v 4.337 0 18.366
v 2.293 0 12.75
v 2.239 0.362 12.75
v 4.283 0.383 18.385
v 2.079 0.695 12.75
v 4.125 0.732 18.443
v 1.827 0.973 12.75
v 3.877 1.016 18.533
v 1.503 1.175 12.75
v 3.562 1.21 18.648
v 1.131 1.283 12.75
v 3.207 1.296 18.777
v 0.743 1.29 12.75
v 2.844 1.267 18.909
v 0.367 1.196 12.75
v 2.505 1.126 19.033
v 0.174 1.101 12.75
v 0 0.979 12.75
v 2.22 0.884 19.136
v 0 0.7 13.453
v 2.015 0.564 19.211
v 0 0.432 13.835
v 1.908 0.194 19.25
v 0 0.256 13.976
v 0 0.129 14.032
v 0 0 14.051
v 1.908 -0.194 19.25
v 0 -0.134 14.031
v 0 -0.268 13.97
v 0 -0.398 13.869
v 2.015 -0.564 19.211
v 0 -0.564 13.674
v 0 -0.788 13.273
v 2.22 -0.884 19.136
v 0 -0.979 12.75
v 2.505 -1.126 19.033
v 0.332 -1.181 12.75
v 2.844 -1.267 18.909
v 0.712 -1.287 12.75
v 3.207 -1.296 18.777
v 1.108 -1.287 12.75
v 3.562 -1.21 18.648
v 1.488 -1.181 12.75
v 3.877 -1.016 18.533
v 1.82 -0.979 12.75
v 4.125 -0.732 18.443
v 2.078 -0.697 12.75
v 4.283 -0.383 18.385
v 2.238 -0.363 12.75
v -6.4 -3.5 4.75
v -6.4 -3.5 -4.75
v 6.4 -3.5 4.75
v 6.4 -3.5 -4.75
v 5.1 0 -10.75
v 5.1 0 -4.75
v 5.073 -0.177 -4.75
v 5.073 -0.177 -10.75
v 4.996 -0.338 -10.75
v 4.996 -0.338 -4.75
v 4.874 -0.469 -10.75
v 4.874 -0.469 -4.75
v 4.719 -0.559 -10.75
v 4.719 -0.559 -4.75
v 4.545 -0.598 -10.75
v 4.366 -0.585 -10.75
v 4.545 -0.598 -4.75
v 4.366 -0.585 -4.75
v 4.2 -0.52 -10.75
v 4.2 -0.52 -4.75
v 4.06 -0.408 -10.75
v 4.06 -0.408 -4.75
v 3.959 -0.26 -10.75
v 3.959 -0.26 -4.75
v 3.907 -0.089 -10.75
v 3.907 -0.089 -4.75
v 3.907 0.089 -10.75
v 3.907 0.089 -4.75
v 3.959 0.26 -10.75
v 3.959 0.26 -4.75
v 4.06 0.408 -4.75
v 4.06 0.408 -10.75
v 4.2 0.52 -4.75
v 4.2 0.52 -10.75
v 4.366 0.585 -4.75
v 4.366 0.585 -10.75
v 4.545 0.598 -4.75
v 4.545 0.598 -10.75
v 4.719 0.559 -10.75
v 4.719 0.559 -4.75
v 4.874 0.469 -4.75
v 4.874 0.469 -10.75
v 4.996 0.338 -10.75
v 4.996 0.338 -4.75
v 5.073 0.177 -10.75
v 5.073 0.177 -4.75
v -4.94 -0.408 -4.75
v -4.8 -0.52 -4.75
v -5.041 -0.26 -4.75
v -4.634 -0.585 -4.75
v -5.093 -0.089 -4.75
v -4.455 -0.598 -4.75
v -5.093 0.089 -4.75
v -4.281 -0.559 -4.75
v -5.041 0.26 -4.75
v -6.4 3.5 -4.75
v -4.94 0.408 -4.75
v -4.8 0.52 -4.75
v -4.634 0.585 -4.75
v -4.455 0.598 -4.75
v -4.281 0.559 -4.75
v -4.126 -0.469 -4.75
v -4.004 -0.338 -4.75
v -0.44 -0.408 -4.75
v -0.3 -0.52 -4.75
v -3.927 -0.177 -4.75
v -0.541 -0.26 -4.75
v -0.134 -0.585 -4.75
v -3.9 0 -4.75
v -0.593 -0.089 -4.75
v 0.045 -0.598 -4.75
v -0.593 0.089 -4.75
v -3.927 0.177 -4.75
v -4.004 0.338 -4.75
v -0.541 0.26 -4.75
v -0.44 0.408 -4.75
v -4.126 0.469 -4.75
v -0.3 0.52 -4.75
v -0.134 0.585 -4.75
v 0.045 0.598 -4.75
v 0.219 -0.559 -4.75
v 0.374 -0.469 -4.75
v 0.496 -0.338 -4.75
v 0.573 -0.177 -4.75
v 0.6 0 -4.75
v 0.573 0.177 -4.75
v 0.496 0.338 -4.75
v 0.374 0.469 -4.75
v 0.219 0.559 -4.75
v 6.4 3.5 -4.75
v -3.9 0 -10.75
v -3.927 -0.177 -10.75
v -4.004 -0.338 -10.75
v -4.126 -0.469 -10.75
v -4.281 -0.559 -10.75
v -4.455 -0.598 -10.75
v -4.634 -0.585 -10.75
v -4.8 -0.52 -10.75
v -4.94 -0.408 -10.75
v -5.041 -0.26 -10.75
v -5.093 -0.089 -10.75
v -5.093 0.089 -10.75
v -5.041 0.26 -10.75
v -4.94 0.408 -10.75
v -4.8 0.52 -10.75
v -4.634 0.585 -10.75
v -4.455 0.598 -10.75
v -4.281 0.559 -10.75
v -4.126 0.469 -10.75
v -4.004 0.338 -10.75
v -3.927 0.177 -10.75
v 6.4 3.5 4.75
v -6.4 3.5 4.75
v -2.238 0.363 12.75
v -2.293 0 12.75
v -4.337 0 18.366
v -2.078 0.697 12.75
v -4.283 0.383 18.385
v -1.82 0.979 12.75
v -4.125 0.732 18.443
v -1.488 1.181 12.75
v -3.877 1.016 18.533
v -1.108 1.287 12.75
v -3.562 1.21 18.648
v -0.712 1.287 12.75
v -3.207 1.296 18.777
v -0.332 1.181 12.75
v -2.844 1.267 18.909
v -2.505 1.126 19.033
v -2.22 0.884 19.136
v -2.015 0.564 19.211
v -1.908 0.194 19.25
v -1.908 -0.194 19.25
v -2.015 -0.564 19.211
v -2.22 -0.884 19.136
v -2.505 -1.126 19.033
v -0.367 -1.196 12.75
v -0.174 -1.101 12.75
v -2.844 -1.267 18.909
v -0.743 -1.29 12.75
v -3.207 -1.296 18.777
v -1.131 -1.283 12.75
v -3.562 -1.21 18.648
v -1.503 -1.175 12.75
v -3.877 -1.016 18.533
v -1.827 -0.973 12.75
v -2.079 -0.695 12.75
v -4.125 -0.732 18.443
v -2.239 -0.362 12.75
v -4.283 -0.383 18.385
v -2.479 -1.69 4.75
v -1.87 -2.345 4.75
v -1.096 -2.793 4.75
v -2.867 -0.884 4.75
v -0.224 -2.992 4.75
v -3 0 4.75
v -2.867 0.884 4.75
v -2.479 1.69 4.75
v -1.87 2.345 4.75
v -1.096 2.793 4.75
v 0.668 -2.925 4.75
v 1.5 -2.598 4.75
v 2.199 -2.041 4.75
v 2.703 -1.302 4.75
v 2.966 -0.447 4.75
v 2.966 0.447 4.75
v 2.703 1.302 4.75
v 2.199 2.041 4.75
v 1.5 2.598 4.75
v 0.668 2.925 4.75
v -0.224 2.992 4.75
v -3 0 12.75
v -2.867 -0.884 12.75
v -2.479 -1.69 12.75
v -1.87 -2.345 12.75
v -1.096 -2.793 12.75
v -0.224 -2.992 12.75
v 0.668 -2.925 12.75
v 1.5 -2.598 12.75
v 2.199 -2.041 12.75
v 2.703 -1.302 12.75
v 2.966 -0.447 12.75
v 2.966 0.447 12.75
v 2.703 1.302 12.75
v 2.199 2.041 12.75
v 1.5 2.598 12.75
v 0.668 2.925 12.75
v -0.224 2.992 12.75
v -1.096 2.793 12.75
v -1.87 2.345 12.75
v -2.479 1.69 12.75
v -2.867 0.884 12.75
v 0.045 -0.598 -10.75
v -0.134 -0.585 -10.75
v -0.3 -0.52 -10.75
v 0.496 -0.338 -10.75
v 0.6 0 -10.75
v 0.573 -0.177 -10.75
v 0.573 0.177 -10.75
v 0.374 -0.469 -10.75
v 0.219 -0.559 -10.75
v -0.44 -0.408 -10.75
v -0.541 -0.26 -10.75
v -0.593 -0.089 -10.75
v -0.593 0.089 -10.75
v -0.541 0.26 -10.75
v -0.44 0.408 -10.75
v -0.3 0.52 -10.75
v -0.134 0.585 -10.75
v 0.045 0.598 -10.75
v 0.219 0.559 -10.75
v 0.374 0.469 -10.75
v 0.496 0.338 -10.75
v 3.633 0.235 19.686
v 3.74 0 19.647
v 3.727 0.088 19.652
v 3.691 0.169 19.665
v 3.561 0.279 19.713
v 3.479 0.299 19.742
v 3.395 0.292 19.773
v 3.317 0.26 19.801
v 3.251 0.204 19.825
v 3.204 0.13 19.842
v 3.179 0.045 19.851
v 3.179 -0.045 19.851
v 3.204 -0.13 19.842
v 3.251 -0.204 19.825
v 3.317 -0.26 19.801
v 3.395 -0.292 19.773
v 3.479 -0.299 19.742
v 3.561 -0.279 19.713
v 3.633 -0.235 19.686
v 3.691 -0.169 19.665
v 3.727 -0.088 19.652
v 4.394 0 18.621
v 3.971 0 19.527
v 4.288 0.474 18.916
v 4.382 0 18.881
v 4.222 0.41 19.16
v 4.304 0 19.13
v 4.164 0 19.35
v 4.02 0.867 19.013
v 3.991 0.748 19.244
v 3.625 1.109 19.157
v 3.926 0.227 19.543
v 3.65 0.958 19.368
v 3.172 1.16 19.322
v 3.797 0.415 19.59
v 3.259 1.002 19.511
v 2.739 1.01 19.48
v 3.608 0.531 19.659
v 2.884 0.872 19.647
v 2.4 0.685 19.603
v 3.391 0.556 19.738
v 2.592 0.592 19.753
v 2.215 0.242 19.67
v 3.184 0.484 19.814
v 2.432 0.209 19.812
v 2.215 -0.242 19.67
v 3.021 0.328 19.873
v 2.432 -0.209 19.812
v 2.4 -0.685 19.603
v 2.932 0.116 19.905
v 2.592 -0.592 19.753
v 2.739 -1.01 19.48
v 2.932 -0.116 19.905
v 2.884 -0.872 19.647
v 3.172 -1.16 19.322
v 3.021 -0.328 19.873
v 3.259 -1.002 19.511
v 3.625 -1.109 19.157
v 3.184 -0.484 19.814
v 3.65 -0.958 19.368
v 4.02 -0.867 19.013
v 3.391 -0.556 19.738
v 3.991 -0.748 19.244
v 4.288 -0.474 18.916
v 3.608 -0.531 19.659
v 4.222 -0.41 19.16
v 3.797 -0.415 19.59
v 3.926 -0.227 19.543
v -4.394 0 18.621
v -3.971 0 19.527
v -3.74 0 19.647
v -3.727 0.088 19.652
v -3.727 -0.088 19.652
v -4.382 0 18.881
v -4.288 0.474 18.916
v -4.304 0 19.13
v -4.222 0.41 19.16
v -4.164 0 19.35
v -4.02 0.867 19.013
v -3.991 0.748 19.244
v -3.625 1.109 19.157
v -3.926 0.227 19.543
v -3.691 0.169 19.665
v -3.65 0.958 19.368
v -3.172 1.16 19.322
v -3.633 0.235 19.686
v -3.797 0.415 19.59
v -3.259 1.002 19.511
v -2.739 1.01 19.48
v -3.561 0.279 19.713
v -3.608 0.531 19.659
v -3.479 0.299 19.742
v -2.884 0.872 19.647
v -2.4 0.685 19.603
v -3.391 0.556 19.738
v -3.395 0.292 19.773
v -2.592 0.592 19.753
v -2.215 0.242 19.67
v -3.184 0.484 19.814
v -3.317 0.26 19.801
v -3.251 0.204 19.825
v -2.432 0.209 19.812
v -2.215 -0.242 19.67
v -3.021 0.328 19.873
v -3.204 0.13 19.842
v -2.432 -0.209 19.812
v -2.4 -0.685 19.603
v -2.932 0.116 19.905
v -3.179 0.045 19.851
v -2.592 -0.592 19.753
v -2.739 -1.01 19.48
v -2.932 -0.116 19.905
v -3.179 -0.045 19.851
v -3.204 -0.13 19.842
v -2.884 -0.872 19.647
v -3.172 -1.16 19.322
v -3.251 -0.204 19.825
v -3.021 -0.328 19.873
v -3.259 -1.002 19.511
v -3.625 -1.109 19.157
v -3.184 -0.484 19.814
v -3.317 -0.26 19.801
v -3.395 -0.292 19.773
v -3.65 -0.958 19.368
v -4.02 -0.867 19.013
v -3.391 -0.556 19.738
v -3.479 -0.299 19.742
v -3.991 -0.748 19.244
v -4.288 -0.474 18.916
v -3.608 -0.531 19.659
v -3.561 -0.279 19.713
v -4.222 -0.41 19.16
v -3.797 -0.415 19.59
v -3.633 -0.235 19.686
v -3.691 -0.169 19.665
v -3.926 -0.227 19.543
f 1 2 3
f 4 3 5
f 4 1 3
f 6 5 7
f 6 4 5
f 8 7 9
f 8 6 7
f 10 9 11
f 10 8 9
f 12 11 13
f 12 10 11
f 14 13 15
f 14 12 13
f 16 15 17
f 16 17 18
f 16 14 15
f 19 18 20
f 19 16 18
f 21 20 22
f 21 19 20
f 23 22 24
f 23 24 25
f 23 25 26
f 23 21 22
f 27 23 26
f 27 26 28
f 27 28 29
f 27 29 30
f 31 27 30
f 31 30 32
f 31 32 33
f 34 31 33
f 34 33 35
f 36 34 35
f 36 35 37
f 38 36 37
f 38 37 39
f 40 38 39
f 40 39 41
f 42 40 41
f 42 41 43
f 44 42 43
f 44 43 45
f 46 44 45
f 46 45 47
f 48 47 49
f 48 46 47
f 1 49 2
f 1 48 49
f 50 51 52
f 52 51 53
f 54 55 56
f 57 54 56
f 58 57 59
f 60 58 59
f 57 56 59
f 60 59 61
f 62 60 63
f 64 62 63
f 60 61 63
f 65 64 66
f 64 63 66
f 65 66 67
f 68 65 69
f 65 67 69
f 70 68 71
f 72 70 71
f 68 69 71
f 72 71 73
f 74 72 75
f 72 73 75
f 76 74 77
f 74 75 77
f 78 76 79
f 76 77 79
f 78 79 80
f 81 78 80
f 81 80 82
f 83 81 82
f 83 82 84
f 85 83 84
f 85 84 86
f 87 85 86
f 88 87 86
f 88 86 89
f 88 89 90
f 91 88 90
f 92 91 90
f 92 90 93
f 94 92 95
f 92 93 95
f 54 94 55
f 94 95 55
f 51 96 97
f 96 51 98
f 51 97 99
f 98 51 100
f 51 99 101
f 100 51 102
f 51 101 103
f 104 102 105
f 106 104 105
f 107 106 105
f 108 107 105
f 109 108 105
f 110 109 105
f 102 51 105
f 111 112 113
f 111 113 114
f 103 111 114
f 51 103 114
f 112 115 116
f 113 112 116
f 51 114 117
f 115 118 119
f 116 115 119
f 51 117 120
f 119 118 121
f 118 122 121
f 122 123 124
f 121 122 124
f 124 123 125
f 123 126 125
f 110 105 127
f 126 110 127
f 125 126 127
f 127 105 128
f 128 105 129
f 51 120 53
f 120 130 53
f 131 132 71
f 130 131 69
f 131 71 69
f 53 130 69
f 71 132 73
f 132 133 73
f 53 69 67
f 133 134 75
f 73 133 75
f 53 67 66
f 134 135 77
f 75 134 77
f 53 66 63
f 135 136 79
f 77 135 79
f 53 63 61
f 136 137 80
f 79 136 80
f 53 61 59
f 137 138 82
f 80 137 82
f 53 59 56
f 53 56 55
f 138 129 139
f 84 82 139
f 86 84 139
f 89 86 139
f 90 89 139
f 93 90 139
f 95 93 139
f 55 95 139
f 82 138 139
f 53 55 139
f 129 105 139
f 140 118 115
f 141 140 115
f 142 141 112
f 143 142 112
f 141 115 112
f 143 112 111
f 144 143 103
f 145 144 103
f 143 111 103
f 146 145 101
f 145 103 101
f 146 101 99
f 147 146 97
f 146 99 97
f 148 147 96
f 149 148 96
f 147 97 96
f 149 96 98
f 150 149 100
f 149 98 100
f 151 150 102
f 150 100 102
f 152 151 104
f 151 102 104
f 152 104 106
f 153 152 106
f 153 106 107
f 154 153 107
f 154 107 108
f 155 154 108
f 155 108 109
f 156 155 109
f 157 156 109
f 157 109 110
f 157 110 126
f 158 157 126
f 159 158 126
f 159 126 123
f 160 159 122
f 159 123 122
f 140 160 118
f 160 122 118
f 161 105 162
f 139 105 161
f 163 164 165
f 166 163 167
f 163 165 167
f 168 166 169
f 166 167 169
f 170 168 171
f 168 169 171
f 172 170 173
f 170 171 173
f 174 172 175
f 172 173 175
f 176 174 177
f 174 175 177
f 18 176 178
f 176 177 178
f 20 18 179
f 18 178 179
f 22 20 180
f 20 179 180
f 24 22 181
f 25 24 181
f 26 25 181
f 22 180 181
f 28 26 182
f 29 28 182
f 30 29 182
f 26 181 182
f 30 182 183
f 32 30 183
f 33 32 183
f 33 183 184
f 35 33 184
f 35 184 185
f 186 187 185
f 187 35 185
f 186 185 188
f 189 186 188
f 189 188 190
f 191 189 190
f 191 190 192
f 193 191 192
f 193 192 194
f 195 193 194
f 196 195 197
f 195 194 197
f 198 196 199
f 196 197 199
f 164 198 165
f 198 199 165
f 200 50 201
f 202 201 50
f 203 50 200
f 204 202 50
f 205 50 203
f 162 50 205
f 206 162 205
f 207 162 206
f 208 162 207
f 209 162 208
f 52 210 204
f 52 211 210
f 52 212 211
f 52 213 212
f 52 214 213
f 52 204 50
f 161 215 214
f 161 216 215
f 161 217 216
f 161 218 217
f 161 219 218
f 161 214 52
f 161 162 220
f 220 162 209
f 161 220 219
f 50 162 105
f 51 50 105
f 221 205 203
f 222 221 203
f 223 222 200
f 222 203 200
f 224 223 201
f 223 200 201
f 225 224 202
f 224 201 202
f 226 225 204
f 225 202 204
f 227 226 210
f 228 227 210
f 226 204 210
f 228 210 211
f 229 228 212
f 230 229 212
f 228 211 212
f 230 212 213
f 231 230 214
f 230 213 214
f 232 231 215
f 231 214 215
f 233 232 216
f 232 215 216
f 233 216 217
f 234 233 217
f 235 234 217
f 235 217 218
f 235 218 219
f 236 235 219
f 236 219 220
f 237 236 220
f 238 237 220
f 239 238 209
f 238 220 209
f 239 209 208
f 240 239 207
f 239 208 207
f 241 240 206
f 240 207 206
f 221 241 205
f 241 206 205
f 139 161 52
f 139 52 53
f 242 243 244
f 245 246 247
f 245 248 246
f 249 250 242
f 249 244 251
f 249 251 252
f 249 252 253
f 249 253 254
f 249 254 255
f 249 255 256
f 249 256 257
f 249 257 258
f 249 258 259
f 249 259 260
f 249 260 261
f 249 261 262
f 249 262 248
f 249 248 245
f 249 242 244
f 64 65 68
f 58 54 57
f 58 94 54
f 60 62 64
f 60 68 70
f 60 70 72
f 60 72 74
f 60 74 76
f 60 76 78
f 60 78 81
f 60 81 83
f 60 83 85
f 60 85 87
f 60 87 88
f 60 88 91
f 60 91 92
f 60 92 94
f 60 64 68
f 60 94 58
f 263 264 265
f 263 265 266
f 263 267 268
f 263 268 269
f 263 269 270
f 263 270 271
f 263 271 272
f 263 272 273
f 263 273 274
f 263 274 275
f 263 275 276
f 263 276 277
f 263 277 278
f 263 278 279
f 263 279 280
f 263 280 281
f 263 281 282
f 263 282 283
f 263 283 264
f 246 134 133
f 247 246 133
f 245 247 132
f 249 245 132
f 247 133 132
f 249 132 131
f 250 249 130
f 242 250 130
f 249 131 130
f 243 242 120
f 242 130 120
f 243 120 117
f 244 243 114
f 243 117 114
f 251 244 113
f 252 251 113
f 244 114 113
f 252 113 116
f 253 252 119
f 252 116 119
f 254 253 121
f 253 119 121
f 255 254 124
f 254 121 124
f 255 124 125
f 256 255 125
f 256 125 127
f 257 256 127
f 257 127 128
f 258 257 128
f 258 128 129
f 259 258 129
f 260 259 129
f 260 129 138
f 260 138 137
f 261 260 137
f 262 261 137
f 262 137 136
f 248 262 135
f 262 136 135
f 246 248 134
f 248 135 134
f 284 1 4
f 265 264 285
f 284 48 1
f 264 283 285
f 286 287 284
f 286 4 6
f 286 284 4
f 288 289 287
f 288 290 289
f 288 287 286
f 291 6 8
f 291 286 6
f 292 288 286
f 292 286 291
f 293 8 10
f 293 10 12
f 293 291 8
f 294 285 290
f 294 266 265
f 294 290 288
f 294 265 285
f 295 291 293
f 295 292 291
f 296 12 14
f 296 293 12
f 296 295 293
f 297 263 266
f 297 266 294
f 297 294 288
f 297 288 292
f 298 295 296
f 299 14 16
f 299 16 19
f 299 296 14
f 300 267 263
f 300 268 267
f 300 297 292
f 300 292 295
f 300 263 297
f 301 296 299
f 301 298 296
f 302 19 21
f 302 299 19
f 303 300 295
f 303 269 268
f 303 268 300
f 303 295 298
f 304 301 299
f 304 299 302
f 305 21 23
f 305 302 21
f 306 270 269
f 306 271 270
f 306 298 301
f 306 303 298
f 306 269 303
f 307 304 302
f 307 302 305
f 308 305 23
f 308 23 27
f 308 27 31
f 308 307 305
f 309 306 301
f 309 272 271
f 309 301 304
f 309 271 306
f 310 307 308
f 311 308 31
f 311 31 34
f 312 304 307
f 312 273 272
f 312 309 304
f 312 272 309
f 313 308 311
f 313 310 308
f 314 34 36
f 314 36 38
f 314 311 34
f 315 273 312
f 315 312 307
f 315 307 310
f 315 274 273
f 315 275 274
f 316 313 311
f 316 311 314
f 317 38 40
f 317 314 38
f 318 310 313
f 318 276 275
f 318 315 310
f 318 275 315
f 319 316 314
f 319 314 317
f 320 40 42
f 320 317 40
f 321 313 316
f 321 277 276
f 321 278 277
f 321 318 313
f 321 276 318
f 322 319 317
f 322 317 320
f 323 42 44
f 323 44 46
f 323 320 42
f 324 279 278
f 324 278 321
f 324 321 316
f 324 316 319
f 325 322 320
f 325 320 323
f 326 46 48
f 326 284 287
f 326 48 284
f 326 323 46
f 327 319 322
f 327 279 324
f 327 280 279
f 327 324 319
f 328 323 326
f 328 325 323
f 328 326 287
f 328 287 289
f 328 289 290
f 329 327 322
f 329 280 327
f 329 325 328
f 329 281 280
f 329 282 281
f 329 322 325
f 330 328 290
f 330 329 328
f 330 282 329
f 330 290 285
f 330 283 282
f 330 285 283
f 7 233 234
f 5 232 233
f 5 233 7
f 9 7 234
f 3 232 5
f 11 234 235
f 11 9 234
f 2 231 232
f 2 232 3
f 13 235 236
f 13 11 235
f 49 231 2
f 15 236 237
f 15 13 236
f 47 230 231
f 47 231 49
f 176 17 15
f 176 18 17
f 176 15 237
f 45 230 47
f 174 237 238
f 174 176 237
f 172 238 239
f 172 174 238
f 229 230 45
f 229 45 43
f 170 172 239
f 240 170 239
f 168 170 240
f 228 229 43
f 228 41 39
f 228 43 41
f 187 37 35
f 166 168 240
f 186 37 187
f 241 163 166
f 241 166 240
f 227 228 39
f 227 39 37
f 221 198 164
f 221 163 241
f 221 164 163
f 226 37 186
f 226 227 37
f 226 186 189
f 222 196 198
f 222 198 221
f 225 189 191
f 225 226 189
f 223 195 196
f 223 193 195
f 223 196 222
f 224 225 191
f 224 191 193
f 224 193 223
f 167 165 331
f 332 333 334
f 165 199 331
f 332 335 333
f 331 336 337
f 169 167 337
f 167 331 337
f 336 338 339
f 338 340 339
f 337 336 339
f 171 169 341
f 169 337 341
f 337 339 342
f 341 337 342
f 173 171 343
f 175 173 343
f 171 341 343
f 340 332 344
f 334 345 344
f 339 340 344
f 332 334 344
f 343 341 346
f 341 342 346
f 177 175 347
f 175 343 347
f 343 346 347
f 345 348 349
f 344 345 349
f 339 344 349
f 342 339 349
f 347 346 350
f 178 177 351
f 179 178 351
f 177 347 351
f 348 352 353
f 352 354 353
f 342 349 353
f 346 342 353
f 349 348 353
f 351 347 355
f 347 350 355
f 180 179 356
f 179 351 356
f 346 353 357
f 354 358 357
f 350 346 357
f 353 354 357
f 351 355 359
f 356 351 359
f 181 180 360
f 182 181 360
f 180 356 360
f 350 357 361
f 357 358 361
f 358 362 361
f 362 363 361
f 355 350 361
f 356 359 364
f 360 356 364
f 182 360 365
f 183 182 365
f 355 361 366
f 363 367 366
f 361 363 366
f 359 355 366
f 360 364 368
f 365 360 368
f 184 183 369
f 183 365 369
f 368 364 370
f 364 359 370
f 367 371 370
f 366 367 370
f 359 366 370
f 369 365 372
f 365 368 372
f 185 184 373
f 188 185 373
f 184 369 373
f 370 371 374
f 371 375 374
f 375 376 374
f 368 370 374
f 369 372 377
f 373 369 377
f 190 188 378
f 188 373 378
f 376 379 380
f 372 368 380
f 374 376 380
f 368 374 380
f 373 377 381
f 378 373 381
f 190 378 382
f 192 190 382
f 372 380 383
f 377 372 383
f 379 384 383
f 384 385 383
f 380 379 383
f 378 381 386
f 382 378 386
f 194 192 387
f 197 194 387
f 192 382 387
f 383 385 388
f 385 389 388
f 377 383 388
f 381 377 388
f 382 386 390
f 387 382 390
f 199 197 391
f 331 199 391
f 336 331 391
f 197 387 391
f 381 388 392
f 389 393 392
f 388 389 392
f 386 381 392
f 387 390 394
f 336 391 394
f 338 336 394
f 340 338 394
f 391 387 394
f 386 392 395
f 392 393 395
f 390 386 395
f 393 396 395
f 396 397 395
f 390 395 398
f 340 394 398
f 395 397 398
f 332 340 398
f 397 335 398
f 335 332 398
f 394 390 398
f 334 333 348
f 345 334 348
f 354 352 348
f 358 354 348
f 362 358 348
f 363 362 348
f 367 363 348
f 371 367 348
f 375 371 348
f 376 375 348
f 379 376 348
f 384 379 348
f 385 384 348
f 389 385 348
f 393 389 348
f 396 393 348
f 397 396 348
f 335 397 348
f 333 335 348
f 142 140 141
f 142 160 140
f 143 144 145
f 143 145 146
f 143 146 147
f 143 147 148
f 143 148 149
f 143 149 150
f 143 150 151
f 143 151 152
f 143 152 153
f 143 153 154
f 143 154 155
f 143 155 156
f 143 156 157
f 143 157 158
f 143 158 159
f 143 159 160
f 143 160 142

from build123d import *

# Parameters (mm, degrees)
SKETCH1_W            = 12.8
SKETCH1_H            = 9.5
BOSS_EXTRUDE1_DEPTH  = 3.5
SKETCH2_R            = 3
BOSS_EXTRUDE2_DEPTH  = 8
SKETCH4_R            = 1.3
BOSS_EXTRUDE3_DEPTH  = 10
FILLET1_R            = 1
FILLET1_OF_MIRROR1_R = 1
SKETCH5_R            = 0.6
BOSS_EXTRUDE4_DEPTH  = 6


with BuildPart() as part:
    # Sketch1 → Boss-Extrude1 (new, symmetric)
    with BuildSketch(Plane(origin=(0, 0, 0), x_dir=(1, 0, 0), z_dir=(0, 1, 0))):
        Rectangle(SKETCH1_W, SKETCH1_H)
    extrude(amount=BOSS_EXTRUDE1_DEPTH, both=True)

    # Sketch2 → Boss-Extrude2 (add)
    with BuildSketch(Plane.XY.offset(4.75)):
        with Locations(Location((0, 0, 0), (0, 0, 180))):
            Circle(SKETCH2_R)
    extrude(amount=BOSS_EXTRUDE2_DEPTH)

    # Sketch4 → Boss-Extrude3 (add)
    with BuildSketch(Plane(origin=(3.457717226, 0, 19.75), x_dir=(0.9396926207859079, 0, -0.34202014332567043), z_dir=(0.34202014332567043, 0, 0.9396926207859079))):
        Circle(SKETCH4_R)
    boss_extrude3 = extrude(amount=-BOSS_EXTRUDE3_DEPTH)

    # Fillet1
    fillet1_edges = [part.edges().sort_by_distance(p)[0] for p in [
        (2.236116819, 0, 20.194626186),
    ]]
    fillet(fillet1_edges, radius=FILLET1_R)

    # Mirror1: Boss-Extrude3 across plane
    add(boss_extrude3.mirror(Plane(origin=(0, 0, 0), x_dir=(0, 0, 1), z_dir=(1, 0, 0))))

    # Fillet1 of Mirror1
    fillet1_of_mirror1_edges = [part.edges().sort_by_distance(p)[0] for p in [
        (-2.236116819, 0, 20.194626186),
    ]]
    fillet(fillet1_of_mirror1_edges, radius=FILLET1_OF_MIRROR1_R)

    # Sketch5 → Boss-Extrude4 (add)
    with BuildSketch(Plane(origin=(0, 0, -4.75), x_dir=(-1, 0, 0), z_dir=(0, 0, -1))):
        with Locations(Location((0, 0, 0), (0, 0, 180))):
            Circle(SKETCH5_R)
        with Locations(Location((-4.5, 0, 0), (0, 0, 180))):
            Circle(SKETCH5_R)
        with Locations(Location((4.5, 0, 0), (0, 0, 180))):
            Circle(SKETCH5_R)
    extrude(amount=BOSS_EXTRUDE4_DEPTH)


solid = part.part
